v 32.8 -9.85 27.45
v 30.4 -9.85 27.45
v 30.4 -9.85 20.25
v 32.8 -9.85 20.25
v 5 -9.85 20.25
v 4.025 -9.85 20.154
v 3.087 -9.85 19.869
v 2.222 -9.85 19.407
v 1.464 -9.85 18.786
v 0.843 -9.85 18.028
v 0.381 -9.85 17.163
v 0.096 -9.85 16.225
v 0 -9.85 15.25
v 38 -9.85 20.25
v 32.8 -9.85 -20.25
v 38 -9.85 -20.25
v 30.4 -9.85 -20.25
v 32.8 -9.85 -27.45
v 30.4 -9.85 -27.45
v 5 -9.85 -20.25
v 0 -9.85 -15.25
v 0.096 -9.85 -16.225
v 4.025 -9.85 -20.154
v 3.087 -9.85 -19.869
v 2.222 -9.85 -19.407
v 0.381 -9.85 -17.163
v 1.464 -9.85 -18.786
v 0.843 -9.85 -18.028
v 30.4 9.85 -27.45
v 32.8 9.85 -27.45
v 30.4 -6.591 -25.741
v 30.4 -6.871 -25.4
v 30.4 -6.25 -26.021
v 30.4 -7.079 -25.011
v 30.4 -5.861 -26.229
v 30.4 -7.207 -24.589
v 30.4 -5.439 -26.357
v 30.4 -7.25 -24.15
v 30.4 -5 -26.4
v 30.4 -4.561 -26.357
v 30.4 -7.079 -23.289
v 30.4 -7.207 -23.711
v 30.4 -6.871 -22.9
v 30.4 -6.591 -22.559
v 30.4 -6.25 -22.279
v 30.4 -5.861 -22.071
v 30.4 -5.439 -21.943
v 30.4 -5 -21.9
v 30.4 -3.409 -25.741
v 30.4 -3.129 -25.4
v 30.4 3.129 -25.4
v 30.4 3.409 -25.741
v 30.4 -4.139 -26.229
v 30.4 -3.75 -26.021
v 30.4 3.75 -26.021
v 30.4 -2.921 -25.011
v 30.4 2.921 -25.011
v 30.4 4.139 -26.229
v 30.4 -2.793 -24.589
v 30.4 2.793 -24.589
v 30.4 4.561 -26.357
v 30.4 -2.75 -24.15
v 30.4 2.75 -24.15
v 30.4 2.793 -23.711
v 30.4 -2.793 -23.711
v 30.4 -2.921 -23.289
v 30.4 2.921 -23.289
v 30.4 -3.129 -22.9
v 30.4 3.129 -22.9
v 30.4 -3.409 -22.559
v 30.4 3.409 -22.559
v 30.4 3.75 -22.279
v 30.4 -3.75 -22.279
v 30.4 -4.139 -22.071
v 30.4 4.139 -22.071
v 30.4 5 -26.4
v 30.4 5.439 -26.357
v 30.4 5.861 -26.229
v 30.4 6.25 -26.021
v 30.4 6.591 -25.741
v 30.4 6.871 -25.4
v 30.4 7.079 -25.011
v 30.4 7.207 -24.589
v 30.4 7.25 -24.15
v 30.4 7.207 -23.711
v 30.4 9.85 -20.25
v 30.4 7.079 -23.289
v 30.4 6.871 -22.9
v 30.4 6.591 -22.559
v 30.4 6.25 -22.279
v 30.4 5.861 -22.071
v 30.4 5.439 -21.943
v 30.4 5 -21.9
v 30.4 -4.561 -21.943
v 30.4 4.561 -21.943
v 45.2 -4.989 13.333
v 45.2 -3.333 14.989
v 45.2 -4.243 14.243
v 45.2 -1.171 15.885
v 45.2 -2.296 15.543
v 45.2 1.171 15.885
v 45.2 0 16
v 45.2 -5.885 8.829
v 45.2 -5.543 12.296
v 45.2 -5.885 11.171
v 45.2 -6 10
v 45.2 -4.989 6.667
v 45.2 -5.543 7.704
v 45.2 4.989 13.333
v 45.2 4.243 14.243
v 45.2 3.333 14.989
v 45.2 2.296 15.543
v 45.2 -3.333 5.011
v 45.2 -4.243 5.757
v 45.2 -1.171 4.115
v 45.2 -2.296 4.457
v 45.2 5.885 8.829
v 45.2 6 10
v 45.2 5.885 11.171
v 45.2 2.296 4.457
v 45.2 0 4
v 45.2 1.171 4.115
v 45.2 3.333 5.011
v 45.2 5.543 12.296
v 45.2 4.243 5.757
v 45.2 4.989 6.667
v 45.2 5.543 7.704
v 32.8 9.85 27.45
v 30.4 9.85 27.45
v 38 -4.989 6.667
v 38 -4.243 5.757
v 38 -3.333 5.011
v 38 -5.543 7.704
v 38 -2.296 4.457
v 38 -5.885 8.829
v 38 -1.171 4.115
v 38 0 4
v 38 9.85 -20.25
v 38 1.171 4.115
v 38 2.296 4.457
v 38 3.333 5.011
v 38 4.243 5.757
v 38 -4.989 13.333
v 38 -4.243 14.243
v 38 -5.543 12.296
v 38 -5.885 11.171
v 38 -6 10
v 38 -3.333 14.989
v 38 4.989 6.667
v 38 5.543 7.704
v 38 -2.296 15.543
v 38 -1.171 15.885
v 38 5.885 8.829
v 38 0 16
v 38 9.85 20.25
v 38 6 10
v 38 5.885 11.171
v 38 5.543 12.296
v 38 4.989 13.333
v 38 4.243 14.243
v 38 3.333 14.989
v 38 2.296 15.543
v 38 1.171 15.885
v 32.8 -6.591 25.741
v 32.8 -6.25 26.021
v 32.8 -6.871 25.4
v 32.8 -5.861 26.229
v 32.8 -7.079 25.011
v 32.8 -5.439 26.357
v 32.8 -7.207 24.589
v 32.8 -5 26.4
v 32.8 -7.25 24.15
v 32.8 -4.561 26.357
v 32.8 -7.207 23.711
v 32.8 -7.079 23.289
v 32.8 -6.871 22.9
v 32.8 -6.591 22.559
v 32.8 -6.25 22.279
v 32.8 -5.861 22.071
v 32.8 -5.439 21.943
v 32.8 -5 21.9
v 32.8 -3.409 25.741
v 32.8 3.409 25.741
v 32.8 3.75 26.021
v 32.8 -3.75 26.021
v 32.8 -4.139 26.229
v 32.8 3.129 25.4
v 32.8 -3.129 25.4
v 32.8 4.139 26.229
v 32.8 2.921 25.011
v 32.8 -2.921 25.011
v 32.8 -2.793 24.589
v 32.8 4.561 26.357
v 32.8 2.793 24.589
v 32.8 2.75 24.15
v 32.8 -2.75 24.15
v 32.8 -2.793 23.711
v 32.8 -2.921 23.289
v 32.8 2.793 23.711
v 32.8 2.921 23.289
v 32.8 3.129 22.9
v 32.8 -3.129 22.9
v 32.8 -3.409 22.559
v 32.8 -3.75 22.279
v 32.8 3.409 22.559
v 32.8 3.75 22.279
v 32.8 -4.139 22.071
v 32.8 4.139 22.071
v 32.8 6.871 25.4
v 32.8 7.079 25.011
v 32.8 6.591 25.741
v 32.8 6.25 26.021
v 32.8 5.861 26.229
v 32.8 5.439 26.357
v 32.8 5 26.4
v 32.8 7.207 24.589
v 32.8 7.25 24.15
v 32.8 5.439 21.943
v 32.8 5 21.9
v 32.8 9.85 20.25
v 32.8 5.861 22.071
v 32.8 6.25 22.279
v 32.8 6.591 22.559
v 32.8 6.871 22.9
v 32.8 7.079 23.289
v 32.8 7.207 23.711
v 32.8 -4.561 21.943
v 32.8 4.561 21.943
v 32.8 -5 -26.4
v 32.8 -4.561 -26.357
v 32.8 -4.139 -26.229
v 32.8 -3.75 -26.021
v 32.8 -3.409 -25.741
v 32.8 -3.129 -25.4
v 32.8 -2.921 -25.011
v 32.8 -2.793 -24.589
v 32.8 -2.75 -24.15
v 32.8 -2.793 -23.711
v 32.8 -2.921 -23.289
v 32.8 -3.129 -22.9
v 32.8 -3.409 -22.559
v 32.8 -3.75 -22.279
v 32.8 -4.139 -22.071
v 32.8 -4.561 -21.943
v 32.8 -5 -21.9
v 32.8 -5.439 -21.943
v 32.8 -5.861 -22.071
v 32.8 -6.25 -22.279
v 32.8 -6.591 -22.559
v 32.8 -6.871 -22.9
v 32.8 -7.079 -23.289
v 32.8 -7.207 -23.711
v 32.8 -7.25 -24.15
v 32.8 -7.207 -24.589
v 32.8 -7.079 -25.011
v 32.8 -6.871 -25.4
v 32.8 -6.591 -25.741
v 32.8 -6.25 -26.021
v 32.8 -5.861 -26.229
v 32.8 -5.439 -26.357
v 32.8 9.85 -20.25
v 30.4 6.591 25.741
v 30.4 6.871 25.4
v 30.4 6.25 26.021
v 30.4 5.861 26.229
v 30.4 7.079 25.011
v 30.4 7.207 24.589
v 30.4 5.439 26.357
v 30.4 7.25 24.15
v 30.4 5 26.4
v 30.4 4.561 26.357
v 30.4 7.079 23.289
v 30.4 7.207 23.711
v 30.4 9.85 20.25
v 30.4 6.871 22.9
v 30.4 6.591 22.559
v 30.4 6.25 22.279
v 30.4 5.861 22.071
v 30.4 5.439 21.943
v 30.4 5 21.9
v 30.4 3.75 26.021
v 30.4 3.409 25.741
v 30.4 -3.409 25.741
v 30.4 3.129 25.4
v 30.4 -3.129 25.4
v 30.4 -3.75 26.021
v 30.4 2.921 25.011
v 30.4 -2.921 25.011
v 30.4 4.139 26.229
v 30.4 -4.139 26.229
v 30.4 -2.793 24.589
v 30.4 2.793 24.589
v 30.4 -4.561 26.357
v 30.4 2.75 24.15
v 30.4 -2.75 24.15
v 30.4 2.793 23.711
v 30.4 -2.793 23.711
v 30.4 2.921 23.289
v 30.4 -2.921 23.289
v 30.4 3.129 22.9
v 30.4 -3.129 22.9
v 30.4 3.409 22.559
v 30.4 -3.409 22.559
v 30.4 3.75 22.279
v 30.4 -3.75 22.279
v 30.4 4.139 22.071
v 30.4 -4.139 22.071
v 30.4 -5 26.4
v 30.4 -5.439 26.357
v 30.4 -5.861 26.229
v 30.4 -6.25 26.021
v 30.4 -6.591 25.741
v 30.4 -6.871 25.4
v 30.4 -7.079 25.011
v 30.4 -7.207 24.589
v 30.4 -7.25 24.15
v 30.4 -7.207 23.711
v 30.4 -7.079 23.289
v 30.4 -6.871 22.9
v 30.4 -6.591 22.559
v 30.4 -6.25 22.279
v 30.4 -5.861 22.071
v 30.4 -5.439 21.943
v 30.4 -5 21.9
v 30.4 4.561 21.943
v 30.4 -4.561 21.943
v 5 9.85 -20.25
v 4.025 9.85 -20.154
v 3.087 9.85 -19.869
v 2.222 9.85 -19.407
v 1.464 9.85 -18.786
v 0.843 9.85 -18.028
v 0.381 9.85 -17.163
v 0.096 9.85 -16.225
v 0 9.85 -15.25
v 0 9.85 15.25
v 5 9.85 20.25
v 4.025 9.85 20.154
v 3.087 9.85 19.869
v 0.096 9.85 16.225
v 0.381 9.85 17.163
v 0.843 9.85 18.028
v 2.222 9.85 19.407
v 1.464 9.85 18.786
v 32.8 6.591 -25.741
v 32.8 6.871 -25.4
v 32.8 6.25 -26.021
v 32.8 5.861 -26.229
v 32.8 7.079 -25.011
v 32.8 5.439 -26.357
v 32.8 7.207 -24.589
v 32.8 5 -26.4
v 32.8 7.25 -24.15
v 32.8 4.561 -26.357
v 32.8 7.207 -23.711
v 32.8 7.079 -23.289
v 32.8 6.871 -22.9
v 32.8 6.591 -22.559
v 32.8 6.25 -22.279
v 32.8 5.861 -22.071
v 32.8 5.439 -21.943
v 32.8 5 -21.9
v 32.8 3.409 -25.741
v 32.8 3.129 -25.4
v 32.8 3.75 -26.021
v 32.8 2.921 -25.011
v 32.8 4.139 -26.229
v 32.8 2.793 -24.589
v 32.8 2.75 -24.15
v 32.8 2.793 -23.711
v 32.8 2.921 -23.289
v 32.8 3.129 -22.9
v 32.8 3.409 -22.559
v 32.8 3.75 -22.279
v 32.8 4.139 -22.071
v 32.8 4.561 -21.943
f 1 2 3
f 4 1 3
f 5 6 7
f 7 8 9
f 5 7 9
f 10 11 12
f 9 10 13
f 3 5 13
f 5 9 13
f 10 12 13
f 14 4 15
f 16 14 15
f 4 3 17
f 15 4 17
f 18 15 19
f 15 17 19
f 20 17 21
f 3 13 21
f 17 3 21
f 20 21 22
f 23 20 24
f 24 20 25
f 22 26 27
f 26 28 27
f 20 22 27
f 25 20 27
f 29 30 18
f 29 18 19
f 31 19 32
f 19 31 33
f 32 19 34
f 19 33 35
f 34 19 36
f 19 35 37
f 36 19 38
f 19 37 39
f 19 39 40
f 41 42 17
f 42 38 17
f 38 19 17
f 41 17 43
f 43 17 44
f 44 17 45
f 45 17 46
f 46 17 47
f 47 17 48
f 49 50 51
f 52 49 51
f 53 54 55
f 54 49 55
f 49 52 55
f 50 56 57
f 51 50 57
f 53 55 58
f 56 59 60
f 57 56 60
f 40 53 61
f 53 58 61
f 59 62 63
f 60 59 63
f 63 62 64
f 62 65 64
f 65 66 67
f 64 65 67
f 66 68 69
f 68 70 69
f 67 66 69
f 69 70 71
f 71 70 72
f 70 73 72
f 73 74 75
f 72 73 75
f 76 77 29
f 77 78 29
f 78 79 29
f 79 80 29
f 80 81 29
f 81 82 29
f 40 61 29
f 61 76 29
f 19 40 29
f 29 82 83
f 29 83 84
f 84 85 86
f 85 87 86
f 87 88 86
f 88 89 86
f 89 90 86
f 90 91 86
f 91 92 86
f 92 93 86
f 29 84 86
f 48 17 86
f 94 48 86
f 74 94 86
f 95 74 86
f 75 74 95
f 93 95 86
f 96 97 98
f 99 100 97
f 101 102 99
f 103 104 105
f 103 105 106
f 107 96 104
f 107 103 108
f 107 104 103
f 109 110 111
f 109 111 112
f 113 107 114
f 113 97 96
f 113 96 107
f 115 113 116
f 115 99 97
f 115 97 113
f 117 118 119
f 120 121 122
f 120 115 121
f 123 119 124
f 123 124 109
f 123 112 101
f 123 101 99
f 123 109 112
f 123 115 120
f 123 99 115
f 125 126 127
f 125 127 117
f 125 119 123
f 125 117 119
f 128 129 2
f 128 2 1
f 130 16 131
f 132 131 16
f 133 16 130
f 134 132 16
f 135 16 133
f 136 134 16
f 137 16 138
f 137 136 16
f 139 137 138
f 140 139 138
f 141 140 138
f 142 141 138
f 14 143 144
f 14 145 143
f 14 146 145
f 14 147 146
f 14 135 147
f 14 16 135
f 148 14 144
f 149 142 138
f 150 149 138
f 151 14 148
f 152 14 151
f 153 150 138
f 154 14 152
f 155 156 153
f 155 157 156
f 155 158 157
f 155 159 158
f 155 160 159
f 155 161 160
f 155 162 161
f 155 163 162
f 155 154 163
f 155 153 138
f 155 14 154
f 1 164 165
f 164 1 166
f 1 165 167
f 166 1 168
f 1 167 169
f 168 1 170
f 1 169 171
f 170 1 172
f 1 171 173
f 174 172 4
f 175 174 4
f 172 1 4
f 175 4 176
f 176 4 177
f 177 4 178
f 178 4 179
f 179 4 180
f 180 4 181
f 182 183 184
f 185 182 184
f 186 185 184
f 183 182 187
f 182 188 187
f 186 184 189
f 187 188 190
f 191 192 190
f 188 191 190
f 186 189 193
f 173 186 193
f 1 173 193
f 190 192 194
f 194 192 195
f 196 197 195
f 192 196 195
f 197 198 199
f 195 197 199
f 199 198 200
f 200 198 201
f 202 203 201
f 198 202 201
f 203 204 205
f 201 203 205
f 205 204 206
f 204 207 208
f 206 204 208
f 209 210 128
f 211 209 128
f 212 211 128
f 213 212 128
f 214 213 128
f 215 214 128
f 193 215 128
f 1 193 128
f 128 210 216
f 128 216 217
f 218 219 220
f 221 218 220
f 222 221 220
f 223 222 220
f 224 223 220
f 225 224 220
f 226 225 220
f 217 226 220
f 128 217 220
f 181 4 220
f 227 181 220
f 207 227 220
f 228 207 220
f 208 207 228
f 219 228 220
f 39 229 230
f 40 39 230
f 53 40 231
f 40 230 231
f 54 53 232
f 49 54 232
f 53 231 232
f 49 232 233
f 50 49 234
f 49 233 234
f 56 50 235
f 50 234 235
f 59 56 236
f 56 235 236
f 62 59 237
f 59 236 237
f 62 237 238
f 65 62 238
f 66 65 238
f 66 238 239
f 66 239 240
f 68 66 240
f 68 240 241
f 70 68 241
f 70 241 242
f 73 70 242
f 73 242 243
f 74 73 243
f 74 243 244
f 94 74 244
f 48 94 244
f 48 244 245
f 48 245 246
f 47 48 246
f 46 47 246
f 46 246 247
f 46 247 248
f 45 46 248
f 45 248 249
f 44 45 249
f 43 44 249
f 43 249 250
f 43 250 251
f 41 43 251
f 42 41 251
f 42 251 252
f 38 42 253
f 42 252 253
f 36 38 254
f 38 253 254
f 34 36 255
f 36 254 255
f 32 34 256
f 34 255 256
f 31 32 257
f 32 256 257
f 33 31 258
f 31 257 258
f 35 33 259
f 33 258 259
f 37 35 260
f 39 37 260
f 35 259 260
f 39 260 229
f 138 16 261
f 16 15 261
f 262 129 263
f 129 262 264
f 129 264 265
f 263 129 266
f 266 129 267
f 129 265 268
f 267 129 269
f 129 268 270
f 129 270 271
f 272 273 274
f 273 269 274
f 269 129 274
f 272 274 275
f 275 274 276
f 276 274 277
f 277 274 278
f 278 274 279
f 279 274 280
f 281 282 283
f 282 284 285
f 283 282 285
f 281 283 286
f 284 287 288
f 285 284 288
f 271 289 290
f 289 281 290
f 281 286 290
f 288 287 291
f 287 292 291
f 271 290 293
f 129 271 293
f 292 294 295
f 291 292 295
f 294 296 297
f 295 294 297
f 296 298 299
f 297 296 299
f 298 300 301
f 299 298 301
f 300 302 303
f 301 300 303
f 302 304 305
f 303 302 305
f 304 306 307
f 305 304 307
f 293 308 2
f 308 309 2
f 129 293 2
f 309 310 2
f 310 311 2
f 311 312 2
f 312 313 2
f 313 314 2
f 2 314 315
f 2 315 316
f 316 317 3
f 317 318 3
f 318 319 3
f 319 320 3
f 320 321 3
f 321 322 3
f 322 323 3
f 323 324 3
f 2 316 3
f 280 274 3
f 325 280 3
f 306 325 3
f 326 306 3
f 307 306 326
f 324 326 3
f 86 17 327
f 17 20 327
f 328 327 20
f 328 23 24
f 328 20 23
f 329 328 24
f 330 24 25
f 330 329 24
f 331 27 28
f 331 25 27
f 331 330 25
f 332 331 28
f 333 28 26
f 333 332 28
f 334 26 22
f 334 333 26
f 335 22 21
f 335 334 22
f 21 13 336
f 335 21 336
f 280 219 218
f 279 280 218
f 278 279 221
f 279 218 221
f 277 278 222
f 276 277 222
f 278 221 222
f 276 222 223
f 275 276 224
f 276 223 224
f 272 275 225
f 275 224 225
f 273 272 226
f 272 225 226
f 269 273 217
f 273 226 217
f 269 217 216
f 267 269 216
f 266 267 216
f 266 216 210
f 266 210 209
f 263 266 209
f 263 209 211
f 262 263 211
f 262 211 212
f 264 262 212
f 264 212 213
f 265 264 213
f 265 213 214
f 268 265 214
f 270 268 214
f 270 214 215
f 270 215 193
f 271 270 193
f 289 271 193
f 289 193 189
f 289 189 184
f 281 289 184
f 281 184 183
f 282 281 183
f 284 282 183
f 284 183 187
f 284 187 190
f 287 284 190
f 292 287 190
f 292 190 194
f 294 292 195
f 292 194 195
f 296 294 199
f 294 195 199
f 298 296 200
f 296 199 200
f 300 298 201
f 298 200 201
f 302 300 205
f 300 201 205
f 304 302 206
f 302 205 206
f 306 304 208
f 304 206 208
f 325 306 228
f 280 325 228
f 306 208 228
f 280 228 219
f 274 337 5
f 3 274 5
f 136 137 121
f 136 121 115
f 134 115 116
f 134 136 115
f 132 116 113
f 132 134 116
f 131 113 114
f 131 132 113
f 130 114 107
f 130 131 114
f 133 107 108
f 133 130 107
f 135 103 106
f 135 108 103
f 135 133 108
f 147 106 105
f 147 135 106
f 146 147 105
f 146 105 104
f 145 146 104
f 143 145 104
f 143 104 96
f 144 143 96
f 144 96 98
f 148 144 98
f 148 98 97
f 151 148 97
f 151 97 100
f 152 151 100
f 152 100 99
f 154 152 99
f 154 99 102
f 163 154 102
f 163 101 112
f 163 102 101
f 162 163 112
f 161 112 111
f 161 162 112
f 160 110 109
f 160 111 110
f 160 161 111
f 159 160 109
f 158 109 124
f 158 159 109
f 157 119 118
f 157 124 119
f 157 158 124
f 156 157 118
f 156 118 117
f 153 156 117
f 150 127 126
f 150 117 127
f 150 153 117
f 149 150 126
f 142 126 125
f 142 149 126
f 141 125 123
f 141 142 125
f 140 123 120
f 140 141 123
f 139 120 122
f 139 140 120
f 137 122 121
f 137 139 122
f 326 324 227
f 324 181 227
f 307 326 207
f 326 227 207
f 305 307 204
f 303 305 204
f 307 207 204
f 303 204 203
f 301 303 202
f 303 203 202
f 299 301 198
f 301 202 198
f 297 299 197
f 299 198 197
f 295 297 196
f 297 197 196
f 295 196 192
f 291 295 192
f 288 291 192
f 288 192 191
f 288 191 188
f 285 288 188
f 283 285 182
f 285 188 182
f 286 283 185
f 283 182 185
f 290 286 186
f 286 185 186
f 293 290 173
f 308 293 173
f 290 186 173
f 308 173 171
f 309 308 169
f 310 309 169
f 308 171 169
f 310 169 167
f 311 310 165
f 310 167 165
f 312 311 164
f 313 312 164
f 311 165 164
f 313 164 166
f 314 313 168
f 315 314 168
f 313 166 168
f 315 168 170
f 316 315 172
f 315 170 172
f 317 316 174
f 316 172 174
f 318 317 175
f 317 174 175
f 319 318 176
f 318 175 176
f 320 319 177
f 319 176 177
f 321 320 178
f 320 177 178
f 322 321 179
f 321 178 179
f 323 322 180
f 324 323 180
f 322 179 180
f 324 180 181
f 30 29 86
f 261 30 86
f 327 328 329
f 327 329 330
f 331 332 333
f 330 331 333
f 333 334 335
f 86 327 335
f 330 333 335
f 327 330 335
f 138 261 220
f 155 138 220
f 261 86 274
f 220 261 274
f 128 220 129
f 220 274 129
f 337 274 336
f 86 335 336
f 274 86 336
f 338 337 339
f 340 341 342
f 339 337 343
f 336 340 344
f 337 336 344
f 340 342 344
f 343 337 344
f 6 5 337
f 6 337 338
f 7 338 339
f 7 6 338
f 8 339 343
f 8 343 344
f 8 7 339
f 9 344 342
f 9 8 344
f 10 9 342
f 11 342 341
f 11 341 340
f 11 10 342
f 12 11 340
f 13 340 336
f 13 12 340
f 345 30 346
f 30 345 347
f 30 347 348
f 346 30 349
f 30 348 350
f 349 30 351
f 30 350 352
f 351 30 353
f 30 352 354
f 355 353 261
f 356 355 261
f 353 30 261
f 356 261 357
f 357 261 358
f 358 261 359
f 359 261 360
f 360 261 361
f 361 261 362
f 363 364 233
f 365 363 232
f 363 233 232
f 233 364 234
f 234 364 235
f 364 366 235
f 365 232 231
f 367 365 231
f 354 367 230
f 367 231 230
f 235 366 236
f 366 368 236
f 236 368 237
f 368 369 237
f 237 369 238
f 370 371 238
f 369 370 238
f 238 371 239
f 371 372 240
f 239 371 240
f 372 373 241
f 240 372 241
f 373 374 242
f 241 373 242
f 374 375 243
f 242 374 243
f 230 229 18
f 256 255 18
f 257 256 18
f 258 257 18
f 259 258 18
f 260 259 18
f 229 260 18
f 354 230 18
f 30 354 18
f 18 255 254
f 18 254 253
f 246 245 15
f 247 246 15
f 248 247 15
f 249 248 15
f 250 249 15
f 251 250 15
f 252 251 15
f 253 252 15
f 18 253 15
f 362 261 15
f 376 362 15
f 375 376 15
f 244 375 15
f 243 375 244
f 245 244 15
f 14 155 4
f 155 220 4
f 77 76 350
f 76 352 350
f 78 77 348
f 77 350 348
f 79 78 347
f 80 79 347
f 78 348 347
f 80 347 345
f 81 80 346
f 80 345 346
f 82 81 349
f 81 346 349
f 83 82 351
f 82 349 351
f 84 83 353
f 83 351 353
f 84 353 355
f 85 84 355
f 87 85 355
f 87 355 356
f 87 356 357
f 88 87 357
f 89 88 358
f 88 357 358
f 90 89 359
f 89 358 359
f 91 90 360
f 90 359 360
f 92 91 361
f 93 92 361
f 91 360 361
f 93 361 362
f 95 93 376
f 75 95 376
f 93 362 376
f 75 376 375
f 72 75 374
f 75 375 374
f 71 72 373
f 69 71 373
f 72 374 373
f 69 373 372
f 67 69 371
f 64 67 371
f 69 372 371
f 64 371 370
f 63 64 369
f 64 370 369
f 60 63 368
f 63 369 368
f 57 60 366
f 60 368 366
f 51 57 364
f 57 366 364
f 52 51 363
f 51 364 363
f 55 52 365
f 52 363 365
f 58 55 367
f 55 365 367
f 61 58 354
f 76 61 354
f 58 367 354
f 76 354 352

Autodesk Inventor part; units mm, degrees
ref_plane "YZ Plane" through (0, 0, 0) normal (1, 0, 0) x (0, 1, 0)
ref_plane "XZ Plane" through (0, 0, 0) normal (0, 1, 0) x (-1, 0, 0)
ref_plane "XY Plane" through (0, 0, 0) normal (0, 0, 1) x (1, 0, 0)
sketch "Esquisse1" plane through (0, 0, 0) normal (1, 0, 0) x (0, 1, 0)
  line L0 (9.85, 20.25) -> (-9.85, 20.25)
  line L1 (-9.85, 20.25) -> (-9.85, -20.25)
  line L2 (-9.85, -20.25) -> (9.85, -20.25)
  line L3 (9.85, -20.25) -> (9.85, 20.25)
  line L4 (9.85, 20.25) -> (-9.85, -20.25)
  line L5 (-9.85, 20.25) -> (9.85, -20.25)
  point P0 (0, 0)
  point P1 (0, 0)
  point P2 (0, 0)
  dimension "d0" = 19.7
  dimension "d1" = 40.5
extrude "Extrusion1" add sketch "Esquisse1" along normal blind 38
sketch "Esquisse2" plane through (0, -9.85, -20.25) normal (0, 0, -1) x (-1, 0, 0)
  line L0 (0, 0) -> (-38, 0) projected
  line L1 (0, 19.7) -> (-38, 19.7) projected
  line L2 (-32.8, 0) -> (-30.4, 0)
  line L3 (-30.4, 0) -> (-30.4, 19.7)
  line L4 (-30.4, 19.7) -> (-32.8, 19.7)
  line L5 (-32.8, 19.7) -> (-32.8, 0)
  line L6 (-38, 0) -> (-38, 19.7) projected
  point P0 (0, 9.85)
  dimension "d4" = 5.2
  dimension "d5" = 2.4
extrude "Extrusion2" add sketch "Esquisse2" along normal blind 7.2 contours L0 L5 L1 L3
sketch "Esquisse3" plane through (0, -9.85, 20.25) normal (0, 0, 1) x (1, 0, 0)
  line L0 (32.8, 19.7) -> (38, 19.7) projected
  line L1 (32.8, 19.7) -> (30.4, 19.7)
  line L2 (30.4, 19.7) -> (30.4, 0)
  line L3 (30.4, 0) -> (32.8, 0)
  line L4 (32.8, 0) -> (32.8, 19.7)
  point P0 (0, 9.85)
extrude "Extrusion3" add sketch "Esquisse3" along normal blind 7.2
sketch "Esquisse4" plane through (32.8, -9.85, 20.25) normal (1, 0, 0) x (0, 0, -1)
  line L0 (40.5, 19.7) -> (0, 19.7) projected
  line L1 (20.25, 19.7) -> (20.25, 0)
  line L2 (0, 0) -> (40.5, 0) projected
  circle A0 centre (-3.9, 14.85) radius 2.25
  line L3 (-7.2, 19.7) -> (-7.2, 0) projected
  line L4 (-7.2, 9.85) -> (47.7, 9.85)
  line L5 (47.7, 0) -> (47.7, 19.7) projected
  circle A1 centre (-3.9, 4.85) radius 2.25
  circle A2 centre (44.4, 14.85) radius 2.25
  circle A3 centre (44.4, 4.85) radius 2.25
  point P0 (20.25, 9.85)
  dimension "d10" = 4.5
  dimension "d11" = 10
  dimension "d19" = 24.15
extrude "Extrusion4" cut sketch "Esquisse4" against normal blind 7.2
sketch "Esquisse5" plane through (38, 0, 0) normal (1, 0, 0) x (0, 0, -1)
  circle A0 centre (-10, 0) radius 6
  point P0 (0, 0)
  dimension "d14" = 12
  dimension "d15" = 10
extrude "Extrusion5" add sketch "Esquisse5" along normal blind 7.2
fillet "Congé1" radius 5 2 edges at (0, 0, 20.25) (0, 0, -20.25)
properties part number "servomoteur_roues"
